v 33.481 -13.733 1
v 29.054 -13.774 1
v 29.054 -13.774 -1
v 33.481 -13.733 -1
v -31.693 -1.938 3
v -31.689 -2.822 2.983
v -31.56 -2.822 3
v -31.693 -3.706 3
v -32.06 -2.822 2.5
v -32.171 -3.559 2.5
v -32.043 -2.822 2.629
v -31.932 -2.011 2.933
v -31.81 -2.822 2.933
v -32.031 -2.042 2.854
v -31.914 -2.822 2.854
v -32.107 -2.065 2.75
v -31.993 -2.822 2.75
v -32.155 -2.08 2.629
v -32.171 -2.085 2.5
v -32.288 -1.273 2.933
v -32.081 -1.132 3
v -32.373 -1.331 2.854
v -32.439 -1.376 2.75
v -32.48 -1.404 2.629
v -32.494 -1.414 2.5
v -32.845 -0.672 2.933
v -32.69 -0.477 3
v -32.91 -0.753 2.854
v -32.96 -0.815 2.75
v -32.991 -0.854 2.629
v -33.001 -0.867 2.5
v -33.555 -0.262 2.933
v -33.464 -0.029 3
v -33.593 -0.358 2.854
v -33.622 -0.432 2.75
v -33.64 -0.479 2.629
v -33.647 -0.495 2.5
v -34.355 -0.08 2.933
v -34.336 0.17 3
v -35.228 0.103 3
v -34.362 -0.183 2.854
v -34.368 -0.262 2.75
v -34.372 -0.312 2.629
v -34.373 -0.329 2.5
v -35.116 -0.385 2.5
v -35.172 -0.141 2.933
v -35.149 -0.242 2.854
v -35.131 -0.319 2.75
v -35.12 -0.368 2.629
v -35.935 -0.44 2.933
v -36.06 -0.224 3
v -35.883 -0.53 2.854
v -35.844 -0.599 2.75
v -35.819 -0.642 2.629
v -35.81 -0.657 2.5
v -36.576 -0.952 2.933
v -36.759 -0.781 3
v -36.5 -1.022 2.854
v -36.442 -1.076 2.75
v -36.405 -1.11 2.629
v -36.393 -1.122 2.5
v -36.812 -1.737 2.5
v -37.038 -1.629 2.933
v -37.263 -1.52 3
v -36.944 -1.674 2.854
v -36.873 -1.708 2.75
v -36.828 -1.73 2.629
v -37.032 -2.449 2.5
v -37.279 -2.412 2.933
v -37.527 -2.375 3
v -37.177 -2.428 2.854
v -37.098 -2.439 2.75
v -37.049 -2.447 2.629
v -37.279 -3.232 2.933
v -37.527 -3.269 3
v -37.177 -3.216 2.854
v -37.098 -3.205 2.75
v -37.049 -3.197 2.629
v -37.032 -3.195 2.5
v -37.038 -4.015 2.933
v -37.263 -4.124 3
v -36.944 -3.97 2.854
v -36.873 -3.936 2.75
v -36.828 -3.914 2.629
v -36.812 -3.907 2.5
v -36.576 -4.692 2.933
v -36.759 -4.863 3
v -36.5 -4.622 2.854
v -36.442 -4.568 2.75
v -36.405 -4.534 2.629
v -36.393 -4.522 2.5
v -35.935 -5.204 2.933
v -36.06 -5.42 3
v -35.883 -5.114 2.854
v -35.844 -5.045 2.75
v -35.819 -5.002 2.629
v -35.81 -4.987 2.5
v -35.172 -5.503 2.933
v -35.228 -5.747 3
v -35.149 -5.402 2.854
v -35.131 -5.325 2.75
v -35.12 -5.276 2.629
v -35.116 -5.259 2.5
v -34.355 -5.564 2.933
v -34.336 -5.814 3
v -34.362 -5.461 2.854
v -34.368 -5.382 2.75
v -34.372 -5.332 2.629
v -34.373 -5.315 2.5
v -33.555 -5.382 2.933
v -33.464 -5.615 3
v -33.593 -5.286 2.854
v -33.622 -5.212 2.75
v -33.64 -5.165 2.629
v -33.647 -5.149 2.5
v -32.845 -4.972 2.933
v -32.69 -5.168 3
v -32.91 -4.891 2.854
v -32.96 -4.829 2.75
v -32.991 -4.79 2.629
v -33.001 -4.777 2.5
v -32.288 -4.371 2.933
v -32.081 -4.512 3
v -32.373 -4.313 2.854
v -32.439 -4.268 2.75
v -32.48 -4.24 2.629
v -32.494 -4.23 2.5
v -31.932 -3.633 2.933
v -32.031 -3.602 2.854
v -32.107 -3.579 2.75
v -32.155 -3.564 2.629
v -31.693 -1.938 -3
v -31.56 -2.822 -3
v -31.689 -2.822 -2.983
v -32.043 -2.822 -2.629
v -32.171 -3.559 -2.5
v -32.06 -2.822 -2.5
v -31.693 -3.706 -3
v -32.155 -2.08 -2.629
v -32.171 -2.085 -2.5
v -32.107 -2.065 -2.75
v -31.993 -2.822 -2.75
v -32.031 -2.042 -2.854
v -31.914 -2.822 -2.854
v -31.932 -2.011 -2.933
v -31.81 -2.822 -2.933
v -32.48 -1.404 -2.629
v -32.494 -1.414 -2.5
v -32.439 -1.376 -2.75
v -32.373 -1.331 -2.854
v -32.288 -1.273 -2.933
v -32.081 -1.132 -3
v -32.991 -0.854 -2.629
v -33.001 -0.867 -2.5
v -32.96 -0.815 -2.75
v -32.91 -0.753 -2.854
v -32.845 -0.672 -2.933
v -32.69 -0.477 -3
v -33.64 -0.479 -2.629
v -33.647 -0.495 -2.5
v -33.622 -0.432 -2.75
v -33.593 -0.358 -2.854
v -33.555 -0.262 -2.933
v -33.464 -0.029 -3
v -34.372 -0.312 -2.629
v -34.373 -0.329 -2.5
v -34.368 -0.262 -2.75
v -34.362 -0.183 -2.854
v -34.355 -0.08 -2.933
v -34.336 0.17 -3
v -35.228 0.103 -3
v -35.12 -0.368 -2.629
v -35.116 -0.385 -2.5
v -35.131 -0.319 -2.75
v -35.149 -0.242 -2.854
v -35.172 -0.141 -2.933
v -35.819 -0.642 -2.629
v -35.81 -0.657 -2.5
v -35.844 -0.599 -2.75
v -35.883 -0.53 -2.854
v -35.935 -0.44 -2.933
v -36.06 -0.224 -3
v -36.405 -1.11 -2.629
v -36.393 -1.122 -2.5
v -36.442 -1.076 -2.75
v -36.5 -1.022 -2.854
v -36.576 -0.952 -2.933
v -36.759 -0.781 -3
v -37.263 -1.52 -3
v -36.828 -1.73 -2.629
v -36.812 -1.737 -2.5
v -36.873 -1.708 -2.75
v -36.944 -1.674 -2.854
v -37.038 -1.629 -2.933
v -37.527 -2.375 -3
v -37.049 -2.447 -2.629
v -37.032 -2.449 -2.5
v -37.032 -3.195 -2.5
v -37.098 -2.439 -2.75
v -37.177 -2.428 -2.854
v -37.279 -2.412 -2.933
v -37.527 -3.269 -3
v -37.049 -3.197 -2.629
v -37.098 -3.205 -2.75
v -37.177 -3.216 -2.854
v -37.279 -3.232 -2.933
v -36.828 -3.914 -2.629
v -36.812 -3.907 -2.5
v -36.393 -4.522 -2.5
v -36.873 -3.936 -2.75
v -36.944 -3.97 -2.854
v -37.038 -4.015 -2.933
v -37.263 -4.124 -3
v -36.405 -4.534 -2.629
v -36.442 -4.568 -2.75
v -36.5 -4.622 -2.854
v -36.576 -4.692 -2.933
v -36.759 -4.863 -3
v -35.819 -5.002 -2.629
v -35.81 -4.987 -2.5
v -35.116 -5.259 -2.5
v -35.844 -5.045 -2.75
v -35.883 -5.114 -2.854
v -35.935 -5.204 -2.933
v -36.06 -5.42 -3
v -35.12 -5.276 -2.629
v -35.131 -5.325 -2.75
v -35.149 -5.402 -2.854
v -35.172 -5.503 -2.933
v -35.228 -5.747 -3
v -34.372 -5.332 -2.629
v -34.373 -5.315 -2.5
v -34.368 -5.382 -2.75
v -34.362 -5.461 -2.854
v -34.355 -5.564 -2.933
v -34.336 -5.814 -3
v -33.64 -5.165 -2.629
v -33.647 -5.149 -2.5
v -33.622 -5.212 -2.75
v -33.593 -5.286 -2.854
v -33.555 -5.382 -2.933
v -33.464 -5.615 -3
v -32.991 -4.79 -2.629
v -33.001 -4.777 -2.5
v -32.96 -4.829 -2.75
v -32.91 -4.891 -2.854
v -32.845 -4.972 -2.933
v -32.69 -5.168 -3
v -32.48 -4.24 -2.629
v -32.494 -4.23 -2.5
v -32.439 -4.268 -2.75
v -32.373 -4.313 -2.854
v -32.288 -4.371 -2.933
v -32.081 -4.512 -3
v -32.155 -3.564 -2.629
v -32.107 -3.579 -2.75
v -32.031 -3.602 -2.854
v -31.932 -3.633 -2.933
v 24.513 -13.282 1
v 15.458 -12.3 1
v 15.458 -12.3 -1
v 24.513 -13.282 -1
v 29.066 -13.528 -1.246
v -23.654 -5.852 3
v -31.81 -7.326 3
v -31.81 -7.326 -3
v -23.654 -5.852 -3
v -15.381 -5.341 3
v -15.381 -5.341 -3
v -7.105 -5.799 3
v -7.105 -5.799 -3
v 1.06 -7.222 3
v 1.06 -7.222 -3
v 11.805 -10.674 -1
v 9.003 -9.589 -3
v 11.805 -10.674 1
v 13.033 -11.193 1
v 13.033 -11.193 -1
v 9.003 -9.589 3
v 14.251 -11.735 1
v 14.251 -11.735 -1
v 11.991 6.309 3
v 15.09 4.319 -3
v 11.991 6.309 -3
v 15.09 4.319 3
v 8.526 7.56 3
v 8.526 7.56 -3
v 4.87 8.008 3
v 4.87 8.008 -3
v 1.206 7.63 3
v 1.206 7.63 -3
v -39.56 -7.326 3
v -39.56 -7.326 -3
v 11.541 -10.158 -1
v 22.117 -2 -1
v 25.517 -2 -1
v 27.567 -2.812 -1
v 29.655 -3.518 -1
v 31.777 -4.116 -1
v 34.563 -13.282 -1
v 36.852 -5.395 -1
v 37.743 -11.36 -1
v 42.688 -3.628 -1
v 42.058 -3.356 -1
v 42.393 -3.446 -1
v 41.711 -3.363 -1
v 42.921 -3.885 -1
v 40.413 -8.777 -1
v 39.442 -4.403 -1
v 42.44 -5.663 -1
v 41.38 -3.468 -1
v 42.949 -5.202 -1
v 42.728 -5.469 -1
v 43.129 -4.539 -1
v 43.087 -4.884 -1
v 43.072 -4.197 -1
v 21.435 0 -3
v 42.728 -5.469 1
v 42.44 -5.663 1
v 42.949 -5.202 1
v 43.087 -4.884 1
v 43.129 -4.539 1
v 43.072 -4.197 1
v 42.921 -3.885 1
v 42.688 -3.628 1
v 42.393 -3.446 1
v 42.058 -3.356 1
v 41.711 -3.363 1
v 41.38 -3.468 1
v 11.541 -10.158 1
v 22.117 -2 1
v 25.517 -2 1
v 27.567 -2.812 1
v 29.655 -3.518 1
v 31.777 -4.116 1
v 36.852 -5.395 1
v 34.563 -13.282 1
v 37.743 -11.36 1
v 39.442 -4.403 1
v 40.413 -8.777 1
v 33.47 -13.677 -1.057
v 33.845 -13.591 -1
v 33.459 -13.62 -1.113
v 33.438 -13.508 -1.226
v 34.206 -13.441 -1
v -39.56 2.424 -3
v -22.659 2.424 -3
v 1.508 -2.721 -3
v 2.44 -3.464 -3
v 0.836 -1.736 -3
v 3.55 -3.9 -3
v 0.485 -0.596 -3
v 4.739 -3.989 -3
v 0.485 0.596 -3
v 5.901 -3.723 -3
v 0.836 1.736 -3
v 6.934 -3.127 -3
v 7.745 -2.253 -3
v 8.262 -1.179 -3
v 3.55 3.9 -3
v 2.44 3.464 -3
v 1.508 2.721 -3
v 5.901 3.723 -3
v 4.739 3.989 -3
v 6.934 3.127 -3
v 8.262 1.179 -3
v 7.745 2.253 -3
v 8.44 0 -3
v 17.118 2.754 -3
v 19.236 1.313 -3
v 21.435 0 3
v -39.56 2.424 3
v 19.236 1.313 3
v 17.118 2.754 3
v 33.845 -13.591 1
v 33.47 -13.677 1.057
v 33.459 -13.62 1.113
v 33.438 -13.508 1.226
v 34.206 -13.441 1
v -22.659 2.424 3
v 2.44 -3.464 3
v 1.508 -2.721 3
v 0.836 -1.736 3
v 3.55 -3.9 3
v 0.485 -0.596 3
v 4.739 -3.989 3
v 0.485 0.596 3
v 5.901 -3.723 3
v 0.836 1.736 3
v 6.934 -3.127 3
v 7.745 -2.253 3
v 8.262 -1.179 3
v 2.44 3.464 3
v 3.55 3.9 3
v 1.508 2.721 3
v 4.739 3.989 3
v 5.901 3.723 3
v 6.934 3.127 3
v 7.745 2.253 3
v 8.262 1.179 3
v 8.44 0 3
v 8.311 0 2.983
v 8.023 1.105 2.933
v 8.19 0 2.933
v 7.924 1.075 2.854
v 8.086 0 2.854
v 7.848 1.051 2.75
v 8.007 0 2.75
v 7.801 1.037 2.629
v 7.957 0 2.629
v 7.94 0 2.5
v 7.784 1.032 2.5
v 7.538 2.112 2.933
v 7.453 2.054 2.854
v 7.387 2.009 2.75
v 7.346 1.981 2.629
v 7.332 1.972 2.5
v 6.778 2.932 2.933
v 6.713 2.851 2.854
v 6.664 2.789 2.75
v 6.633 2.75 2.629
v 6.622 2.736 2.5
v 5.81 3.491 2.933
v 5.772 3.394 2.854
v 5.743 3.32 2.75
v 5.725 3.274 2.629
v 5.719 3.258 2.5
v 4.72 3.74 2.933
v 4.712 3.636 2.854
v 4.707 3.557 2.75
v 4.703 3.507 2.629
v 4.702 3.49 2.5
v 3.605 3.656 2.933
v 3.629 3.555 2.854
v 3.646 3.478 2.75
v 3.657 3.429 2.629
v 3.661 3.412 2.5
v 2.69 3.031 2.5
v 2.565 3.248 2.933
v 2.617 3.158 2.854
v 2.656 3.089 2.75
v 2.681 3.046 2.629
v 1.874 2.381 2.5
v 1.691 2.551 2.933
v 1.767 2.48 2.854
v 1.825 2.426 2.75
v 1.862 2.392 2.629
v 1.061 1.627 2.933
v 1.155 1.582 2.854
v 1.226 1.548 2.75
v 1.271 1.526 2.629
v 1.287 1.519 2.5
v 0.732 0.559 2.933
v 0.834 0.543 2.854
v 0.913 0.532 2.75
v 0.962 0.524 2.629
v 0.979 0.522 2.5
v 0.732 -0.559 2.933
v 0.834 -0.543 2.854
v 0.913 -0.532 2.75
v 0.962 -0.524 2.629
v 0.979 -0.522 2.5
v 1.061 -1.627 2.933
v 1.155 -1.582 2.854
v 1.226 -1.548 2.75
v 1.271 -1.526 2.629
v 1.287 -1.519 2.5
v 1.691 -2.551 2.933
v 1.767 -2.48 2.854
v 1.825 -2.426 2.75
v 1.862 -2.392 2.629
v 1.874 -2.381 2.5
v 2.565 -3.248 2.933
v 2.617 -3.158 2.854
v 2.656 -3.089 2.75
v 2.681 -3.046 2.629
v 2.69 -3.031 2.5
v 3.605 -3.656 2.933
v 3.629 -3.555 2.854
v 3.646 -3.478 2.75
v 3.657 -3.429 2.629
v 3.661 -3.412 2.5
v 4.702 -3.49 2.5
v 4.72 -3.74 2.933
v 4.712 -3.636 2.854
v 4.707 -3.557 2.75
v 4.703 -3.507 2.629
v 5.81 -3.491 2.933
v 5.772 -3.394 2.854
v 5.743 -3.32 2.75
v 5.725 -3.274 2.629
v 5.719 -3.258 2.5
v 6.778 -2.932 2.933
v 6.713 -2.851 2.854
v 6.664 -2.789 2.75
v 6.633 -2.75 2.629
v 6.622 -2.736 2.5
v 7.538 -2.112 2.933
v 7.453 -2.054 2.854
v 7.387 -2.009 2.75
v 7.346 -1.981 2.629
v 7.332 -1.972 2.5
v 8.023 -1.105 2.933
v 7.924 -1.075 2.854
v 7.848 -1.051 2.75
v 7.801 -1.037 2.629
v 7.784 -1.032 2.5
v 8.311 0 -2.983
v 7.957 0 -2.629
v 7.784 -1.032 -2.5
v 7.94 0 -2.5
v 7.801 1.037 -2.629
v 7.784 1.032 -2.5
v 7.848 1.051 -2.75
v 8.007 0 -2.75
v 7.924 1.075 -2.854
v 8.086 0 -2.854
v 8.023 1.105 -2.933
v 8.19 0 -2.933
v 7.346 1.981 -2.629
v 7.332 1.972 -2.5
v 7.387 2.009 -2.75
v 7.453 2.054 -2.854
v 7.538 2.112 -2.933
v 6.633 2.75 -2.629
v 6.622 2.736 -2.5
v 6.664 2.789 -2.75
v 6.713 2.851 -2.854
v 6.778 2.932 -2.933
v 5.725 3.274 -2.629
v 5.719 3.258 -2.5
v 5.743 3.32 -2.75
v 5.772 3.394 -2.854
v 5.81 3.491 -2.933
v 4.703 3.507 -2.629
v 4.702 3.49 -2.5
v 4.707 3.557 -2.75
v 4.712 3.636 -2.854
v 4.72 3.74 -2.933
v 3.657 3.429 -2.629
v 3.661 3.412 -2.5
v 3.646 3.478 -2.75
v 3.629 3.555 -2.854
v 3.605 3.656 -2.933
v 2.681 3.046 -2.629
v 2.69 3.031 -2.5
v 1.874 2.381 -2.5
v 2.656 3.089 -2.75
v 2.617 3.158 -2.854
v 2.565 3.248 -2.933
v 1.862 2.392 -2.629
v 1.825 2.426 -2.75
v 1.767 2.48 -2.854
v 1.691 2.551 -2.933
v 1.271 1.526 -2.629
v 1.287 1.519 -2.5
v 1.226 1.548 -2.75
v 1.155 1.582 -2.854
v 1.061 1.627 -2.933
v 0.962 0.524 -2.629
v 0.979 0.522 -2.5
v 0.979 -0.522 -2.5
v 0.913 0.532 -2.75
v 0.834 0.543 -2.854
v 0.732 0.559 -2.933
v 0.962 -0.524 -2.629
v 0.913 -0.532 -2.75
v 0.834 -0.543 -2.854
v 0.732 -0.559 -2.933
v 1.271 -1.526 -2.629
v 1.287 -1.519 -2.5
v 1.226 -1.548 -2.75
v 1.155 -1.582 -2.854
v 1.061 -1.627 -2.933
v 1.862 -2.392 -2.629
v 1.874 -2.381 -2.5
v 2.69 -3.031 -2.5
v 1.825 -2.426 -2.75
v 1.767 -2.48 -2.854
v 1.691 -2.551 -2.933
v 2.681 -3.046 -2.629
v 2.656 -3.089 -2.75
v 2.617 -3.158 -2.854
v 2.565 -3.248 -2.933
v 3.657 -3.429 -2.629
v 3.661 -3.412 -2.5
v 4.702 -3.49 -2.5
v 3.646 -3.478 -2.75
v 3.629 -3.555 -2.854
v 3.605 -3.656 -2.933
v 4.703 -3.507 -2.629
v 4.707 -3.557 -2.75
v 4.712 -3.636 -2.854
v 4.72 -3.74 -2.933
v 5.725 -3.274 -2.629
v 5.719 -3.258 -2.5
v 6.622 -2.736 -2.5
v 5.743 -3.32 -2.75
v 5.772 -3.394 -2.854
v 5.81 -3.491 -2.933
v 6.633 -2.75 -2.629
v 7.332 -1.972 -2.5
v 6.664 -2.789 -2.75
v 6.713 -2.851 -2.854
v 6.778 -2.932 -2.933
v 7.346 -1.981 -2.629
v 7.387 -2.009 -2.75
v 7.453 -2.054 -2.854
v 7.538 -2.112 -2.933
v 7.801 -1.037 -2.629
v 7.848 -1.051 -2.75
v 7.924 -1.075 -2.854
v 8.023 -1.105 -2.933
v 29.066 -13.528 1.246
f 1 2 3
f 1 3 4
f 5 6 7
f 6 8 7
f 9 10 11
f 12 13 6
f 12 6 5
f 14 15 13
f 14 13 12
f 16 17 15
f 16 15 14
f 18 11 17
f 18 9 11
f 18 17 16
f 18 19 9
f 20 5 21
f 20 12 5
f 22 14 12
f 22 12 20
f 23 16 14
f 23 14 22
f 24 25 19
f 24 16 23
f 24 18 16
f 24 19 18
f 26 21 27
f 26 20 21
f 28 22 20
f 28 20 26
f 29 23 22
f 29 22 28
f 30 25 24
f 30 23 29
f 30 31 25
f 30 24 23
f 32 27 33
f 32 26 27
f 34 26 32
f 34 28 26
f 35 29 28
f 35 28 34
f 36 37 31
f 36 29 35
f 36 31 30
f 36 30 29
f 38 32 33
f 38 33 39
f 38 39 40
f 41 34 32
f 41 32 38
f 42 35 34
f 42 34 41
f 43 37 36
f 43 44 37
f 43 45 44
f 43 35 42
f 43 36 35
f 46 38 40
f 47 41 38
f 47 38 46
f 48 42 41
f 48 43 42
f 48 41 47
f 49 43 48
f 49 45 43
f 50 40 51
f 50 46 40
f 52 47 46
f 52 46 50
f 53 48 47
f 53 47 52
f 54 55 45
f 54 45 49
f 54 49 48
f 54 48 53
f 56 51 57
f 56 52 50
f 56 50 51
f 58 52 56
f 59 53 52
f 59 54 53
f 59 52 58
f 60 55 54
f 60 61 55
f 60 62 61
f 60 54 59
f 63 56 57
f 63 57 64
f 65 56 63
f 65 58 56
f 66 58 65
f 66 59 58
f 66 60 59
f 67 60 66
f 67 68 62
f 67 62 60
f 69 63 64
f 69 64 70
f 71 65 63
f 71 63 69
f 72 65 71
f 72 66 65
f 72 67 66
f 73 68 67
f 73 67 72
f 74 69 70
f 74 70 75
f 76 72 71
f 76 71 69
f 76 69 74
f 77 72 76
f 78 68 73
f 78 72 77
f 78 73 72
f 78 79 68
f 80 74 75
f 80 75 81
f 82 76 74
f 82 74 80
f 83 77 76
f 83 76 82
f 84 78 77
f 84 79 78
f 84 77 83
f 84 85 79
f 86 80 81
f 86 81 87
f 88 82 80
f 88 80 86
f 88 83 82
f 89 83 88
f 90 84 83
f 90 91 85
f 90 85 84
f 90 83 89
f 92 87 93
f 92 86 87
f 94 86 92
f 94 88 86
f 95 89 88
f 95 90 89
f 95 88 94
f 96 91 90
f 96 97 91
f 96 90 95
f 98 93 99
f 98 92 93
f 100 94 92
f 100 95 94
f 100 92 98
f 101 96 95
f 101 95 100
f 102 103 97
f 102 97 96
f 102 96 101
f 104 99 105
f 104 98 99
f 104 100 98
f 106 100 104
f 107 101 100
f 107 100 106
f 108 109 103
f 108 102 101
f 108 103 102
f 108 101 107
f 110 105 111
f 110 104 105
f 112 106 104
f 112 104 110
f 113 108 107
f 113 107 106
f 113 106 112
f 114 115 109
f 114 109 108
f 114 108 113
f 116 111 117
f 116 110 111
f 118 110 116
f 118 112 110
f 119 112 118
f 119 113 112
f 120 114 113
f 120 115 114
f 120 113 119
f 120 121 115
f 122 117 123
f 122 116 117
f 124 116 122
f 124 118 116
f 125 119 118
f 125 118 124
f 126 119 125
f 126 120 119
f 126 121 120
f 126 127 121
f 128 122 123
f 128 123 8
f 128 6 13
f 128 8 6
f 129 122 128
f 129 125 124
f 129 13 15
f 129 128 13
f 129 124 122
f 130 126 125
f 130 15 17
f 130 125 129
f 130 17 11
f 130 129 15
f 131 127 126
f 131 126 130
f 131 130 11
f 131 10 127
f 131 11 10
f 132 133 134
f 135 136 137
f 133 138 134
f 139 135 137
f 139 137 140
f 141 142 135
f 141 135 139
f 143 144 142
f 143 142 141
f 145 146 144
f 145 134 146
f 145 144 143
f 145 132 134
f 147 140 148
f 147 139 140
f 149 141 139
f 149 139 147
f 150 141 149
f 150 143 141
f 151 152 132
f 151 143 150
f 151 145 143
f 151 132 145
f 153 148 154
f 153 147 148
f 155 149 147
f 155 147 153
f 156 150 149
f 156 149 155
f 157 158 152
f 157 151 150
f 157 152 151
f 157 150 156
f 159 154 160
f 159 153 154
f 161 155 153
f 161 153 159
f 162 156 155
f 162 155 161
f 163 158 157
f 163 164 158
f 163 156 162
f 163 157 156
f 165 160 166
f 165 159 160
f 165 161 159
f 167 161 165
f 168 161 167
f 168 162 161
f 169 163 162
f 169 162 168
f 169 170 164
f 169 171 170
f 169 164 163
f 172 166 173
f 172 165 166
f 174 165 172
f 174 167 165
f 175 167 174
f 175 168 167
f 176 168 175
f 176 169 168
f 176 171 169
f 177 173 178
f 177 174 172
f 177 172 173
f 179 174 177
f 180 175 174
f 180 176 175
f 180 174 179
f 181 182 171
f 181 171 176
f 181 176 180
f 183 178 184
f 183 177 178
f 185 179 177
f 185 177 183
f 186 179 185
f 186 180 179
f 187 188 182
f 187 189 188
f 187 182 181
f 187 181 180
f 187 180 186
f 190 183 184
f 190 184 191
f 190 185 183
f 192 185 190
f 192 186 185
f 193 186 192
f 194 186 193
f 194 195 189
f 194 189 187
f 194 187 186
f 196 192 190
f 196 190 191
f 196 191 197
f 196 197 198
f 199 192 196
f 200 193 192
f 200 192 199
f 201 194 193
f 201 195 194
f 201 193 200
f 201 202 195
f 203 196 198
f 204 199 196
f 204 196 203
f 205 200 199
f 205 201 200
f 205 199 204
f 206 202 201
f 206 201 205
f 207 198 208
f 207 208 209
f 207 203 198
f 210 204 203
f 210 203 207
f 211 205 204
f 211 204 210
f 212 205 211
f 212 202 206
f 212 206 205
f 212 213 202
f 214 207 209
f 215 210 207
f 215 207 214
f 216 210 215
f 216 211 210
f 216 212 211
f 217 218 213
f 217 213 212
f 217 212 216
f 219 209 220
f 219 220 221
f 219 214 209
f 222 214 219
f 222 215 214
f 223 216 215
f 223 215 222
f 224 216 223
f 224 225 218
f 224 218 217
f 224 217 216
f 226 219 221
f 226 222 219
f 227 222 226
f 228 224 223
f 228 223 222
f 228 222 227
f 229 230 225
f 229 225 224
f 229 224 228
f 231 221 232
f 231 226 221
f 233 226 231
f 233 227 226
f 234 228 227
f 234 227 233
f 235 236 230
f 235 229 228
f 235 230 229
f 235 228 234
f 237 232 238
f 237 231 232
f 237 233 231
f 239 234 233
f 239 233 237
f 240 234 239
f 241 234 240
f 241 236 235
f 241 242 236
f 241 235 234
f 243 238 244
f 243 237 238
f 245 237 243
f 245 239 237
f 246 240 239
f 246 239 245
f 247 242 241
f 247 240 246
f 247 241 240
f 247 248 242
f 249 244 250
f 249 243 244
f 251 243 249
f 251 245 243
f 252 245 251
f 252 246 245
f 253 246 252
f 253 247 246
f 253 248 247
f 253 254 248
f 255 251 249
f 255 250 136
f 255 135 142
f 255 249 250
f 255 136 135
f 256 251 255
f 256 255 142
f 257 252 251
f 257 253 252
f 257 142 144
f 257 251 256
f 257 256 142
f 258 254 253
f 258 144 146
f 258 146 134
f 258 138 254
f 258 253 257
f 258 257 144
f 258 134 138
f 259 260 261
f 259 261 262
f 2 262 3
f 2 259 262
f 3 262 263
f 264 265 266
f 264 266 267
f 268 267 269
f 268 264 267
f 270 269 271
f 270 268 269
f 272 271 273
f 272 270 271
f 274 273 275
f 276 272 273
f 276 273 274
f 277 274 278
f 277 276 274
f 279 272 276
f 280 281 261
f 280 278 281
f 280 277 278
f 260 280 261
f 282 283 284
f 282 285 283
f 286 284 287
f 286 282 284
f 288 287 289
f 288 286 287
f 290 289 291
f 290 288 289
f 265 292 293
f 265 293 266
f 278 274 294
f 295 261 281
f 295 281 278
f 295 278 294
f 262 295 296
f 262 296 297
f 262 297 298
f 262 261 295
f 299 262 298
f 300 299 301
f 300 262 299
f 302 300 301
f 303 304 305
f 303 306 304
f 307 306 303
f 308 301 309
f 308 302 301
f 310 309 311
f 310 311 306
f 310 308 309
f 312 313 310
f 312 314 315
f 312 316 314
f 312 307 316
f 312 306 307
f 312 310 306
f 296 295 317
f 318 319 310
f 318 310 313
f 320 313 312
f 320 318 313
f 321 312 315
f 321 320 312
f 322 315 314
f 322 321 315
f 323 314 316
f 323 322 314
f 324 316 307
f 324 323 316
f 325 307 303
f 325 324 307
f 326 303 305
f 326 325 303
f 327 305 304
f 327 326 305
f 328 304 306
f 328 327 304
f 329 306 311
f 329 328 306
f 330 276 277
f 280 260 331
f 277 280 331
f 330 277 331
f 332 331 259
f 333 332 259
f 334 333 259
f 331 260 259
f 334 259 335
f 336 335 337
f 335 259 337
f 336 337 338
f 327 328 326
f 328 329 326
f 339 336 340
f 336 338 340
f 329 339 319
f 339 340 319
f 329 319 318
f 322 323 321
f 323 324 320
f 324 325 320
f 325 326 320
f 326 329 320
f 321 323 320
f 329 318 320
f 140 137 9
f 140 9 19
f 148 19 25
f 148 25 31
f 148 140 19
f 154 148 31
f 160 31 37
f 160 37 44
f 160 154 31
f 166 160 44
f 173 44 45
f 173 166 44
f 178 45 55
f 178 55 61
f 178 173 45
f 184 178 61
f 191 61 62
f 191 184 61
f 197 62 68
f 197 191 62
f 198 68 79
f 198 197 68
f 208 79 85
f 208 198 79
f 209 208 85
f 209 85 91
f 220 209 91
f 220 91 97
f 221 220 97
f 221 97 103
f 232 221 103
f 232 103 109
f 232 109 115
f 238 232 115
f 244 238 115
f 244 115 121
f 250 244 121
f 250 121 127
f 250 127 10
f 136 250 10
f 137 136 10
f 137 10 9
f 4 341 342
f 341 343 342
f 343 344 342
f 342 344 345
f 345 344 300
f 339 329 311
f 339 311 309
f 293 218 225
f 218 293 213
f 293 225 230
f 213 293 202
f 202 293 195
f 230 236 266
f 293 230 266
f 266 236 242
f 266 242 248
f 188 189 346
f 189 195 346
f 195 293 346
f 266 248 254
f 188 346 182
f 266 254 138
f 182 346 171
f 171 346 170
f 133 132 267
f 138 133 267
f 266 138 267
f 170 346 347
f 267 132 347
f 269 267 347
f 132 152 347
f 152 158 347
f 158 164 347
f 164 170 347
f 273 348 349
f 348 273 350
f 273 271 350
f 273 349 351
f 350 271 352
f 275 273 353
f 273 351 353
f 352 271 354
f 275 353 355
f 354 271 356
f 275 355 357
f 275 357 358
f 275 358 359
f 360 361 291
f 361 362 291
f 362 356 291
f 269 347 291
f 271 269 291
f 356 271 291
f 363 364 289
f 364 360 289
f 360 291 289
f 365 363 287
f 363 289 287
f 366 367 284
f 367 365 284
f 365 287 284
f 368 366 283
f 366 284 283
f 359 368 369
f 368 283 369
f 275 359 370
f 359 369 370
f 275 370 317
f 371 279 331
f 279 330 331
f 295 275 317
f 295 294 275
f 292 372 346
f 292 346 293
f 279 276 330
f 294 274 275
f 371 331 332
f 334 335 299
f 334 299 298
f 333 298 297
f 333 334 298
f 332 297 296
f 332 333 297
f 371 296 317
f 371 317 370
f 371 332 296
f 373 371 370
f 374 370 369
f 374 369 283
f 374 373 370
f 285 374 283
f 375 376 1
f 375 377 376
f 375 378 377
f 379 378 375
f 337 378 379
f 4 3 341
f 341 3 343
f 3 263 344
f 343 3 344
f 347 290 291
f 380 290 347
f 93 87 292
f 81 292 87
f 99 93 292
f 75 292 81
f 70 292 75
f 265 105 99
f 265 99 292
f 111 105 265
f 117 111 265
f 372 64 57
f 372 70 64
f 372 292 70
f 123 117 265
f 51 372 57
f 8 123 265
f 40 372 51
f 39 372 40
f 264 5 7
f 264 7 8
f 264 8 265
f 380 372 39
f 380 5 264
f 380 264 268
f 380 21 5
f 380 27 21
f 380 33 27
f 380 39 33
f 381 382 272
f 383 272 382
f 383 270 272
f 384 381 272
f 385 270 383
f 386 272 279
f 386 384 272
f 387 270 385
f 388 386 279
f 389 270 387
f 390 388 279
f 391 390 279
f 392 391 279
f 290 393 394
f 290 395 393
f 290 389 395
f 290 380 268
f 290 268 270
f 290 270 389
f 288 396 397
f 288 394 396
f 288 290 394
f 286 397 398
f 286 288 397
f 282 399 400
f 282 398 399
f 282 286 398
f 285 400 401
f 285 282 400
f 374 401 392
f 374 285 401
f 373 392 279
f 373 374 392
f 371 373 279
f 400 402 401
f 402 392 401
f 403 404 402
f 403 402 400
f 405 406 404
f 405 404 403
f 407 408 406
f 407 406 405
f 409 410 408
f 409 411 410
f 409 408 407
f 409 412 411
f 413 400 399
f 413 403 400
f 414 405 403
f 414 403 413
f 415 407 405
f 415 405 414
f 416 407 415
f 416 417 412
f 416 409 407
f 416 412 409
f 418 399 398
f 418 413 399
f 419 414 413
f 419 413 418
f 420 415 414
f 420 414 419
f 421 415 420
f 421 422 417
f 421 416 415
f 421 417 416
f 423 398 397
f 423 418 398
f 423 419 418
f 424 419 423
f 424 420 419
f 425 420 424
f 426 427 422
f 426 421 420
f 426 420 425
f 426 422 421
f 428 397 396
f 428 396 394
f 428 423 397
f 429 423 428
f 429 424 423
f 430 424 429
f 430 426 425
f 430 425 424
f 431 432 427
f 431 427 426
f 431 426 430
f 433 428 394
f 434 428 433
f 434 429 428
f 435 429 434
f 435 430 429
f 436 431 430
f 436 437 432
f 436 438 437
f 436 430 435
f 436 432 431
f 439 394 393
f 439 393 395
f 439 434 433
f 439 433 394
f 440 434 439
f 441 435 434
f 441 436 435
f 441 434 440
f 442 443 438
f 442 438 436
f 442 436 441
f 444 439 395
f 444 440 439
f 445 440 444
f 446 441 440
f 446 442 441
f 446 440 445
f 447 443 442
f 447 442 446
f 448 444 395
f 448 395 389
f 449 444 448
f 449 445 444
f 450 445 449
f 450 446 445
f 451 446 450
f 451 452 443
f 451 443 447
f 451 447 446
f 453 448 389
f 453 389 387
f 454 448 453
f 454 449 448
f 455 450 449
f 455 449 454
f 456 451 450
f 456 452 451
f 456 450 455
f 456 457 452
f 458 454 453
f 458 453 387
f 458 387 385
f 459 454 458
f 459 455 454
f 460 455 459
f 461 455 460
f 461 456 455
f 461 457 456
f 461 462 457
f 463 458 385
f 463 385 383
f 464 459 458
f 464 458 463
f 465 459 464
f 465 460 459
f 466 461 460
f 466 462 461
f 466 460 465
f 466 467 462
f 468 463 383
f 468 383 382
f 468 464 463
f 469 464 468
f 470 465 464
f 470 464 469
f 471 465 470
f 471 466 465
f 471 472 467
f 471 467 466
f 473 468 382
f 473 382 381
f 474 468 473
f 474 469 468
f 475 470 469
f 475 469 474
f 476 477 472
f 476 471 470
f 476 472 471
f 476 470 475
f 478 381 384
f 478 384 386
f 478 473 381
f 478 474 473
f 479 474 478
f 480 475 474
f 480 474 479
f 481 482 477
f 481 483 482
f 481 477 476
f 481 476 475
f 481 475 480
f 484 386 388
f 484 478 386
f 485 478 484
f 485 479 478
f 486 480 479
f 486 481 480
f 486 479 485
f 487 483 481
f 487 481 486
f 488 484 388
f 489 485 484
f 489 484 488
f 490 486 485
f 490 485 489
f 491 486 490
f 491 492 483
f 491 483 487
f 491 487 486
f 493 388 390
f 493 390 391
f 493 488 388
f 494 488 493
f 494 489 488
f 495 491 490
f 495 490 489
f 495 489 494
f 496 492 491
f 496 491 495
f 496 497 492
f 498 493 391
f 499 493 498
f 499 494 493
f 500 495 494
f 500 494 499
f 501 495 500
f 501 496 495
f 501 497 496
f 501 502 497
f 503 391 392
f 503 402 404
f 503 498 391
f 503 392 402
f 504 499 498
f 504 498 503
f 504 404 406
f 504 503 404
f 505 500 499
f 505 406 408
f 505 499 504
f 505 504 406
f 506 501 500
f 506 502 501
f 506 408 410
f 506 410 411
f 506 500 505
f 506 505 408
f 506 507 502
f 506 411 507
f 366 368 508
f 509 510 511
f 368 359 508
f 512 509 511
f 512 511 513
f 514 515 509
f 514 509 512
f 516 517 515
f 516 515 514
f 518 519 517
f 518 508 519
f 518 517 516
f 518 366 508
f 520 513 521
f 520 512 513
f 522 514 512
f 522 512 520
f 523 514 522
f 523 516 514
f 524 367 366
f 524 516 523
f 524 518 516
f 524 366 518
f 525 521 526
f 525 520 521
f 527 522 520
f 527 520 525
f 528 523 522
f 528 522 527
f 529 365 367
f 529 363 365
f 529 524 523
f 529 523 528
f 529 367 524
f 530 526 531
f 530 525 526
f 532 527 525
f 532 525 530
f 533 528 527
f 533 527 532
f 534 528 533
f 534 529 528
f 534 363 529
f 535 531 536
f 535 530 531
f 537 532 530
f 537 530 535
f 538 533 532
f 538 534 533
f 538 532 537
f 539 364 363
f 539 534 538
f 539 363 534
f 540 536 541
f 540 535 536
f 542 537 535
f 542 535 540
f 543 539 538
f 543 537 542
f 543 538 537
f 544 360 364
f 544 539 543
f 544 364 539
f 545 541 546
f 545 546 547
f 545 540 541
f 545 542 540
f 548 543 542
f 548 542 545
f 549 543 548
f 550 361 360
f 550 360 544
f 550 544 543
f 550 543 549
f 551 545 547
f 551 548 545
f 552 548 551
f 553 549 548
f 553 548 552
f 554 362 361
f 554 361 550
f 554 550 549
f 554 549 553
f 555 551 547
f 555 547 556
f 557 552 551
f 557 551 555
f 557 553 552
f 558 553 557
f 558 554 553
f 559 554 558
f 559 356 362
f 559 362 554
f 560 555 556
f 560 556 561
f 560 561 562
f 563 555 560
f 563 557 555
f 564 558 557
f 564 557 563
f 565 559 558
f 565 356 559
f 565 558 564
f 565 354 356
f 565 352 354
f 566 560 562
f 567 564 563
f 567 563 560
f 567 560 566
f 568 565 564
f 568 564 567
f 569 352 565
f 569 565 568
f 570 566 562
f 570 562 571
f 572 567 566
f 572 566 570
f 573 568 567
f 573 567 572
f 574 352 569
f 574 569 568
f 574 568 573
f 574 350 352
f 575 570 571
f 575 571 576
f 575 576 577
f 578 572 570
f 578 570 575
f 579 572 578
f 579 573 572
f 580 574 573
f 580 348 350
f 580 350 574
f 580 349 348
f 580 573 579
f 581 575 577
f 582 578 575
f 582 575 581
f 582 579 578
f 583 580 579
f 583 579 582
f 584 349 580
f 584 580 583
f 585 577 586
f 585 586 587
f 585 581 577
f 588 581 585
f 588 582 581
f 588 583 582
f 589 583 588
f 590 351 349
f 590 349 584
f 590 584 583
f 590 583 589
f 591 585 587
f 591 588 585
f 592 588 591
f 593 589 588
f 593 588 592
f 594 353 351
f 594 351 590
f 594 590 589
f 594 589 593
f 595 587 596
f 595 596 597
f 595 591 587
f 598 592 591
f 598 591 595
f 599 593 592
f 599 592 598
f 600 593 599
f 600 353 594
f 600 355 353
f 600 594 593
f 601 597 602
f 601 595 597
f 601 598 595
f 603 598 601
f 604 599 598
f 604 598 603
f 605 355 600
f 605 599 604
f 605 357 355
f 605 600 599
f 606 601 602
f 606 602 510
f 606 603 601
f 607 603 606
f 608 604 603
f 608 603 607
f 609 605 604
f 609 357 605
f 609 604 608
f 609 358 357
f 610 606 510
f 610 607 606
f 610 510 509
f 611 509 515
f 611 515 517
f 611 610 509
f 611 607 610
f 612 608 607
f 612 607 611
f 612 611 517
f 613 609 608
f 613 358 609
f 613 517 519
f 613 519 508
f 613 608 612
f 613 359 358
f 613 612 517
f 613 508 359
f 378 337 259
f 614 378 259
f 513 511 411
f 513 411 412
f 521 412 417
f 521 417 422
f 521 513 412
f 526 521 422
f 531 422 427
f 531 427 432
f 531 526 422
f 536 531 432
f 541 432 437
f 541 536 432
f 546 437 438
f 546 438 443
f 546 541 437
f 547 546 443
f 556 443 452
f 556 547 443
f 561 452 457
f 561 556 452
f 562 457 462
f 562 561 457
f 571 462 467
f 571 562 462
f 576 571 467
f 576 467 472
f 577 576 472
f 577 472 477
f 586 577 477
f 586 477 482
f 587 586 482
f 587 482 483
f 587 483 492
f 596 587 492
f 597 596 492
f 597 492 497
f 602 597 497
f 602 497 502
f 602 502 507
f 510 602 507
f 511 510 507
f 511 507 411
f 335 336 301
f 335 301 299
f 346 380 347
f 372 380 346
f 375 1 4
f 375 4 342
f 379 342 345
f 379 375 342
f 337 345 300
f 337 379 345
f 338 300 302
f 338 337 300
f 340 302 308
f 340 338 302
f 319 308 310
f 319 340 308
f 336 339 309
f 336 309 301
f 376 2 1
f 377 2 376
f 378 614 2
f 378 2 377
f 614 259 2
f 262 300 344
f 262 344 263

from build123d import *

# Parameters (mm, degrees)
F0_R     = 2.5
F0_R_2   = 3.5
F1_DEPTH = 3
F2_SIZE  = 2
F4_R     = 0.5
F5_DEPTH = 2
F5_TAPER = 45


# Not quite as in the source:
# - a pattern or mirror of a feature is missing from the dataset's text; its kind, count and spacing are read off the source's solid


with BuildPart() as f1:
    # F0 (on Top) → F1 (new body, symmetric)
    with BuildSketch(Plane.XY):
        with BuildLine():
            Line((-22.6589401231, 2.4236629568), (-39.5600539291, 2.4236629568))
            Line((-39.5600539291, 2.4236629568), (-39.5600539291, -7.3263370432))
            Line((-39.5600539291, -7.3263370432), (-31.8100539291, -7.3263370432))
            ThreePointArc((-31.8100539291, -7.3263370432), (-7.74599031, -5.7290436956), (15.4584982429, -12.300361288))
            Line((15.4584982429, -12.300361288), (29.0535219773, -13.773592777))
            Line((29.0535219773, -13.773592777), (33.4806282794, -13.7333460718))
            ThreePointArc((33.4806282794, -13.7333460718), (38.7220078669, -10.5438462203), (42.4399460709, -5.663077347))
            ThreePointArc((42.4399460709, -5.663077347), (43.0076744864, -4.0355880404), (41.3801851798, -3.4678596249))
            Line((41.3801851798, -3.4678596249), (39.4420786101, -4.4034978191))
            Line((39.4420786101, -4.4034978191), (36.8522457248, -5.3948726996))
            Line((36.8522457248, -5.3948726996), (31.776658302, -4.1156165412))
            ThreePointArc((31.776658302, -4.1156165412), (22.9700739727, -0.8151163334), (15.0904607998, 4.3191728497))
            ThreePointArc((15.0904607998, 4.3191728497), (8.5263135264, 7.5598223627), (1.2061465951, 7.6304961974))
            Line((1.2061465951, 7.6304961974), (-22.6589401231, 2.4236629568))
        make_face()
        with Locations((-34.5600539291, -2.8220066844)):
            Circle(F0_R, mode=Mode.SUBTRACT)
        with Locations((4.4399460709, 0)):
            Circle(F0_R_2, mode=Mode.SUBTRACT)
    extrude(amount=F1_DEPTH, both=True)

    # F2
    f2_edges = [f1.edges().sort_by_distance(p)[0] for p in [
        (22.25601, -13.036977, 3),
        (22.25601, -13.036977, -3),
        (31.267075, -13.753469, 3),
        (31.267075, -13.753469, -3),
        (38.722008, -10.543846, 3),
        (38.722008, -10.543846, -3),
    ]]
    chamfer(f2_edges, length=F2_SIZE)

    # F4
    f4_edges = [f1.edges().sort_by_distance(p)[0] for p in [
        (0.939946, 0, -3),
        (-37.060054, -2.822007, -3),
        (-37.060054, -2.822007, 3),
        (0.939946, 0, 3),
    ]]
    fillet(f4_edges, radius=F4_R)

    # F3 (on face) → F5 (cut)
    with BuildSketch(Plane(origin=(0, 0, -3), x_dir=(1, 0, 0), z_dir=(0, 0, -1))):
        Polygon((11.9156481301, 15.2815678021), (9.0032261915, 9.5891237242), (21.4353172765, 0), (52.8852939606, 0), (52.8852939606, 15.2815678021), align=None)
    f5 = extrude(amount=-F5_DEPTH, taper=F5_TAPER, mode=Mode.SUBTRACT)

    # F5_copies: F5 across plane
    add(f5.mirror(Plane.XY), mode=Mode.SUBTRACT)


solid = f1.part
